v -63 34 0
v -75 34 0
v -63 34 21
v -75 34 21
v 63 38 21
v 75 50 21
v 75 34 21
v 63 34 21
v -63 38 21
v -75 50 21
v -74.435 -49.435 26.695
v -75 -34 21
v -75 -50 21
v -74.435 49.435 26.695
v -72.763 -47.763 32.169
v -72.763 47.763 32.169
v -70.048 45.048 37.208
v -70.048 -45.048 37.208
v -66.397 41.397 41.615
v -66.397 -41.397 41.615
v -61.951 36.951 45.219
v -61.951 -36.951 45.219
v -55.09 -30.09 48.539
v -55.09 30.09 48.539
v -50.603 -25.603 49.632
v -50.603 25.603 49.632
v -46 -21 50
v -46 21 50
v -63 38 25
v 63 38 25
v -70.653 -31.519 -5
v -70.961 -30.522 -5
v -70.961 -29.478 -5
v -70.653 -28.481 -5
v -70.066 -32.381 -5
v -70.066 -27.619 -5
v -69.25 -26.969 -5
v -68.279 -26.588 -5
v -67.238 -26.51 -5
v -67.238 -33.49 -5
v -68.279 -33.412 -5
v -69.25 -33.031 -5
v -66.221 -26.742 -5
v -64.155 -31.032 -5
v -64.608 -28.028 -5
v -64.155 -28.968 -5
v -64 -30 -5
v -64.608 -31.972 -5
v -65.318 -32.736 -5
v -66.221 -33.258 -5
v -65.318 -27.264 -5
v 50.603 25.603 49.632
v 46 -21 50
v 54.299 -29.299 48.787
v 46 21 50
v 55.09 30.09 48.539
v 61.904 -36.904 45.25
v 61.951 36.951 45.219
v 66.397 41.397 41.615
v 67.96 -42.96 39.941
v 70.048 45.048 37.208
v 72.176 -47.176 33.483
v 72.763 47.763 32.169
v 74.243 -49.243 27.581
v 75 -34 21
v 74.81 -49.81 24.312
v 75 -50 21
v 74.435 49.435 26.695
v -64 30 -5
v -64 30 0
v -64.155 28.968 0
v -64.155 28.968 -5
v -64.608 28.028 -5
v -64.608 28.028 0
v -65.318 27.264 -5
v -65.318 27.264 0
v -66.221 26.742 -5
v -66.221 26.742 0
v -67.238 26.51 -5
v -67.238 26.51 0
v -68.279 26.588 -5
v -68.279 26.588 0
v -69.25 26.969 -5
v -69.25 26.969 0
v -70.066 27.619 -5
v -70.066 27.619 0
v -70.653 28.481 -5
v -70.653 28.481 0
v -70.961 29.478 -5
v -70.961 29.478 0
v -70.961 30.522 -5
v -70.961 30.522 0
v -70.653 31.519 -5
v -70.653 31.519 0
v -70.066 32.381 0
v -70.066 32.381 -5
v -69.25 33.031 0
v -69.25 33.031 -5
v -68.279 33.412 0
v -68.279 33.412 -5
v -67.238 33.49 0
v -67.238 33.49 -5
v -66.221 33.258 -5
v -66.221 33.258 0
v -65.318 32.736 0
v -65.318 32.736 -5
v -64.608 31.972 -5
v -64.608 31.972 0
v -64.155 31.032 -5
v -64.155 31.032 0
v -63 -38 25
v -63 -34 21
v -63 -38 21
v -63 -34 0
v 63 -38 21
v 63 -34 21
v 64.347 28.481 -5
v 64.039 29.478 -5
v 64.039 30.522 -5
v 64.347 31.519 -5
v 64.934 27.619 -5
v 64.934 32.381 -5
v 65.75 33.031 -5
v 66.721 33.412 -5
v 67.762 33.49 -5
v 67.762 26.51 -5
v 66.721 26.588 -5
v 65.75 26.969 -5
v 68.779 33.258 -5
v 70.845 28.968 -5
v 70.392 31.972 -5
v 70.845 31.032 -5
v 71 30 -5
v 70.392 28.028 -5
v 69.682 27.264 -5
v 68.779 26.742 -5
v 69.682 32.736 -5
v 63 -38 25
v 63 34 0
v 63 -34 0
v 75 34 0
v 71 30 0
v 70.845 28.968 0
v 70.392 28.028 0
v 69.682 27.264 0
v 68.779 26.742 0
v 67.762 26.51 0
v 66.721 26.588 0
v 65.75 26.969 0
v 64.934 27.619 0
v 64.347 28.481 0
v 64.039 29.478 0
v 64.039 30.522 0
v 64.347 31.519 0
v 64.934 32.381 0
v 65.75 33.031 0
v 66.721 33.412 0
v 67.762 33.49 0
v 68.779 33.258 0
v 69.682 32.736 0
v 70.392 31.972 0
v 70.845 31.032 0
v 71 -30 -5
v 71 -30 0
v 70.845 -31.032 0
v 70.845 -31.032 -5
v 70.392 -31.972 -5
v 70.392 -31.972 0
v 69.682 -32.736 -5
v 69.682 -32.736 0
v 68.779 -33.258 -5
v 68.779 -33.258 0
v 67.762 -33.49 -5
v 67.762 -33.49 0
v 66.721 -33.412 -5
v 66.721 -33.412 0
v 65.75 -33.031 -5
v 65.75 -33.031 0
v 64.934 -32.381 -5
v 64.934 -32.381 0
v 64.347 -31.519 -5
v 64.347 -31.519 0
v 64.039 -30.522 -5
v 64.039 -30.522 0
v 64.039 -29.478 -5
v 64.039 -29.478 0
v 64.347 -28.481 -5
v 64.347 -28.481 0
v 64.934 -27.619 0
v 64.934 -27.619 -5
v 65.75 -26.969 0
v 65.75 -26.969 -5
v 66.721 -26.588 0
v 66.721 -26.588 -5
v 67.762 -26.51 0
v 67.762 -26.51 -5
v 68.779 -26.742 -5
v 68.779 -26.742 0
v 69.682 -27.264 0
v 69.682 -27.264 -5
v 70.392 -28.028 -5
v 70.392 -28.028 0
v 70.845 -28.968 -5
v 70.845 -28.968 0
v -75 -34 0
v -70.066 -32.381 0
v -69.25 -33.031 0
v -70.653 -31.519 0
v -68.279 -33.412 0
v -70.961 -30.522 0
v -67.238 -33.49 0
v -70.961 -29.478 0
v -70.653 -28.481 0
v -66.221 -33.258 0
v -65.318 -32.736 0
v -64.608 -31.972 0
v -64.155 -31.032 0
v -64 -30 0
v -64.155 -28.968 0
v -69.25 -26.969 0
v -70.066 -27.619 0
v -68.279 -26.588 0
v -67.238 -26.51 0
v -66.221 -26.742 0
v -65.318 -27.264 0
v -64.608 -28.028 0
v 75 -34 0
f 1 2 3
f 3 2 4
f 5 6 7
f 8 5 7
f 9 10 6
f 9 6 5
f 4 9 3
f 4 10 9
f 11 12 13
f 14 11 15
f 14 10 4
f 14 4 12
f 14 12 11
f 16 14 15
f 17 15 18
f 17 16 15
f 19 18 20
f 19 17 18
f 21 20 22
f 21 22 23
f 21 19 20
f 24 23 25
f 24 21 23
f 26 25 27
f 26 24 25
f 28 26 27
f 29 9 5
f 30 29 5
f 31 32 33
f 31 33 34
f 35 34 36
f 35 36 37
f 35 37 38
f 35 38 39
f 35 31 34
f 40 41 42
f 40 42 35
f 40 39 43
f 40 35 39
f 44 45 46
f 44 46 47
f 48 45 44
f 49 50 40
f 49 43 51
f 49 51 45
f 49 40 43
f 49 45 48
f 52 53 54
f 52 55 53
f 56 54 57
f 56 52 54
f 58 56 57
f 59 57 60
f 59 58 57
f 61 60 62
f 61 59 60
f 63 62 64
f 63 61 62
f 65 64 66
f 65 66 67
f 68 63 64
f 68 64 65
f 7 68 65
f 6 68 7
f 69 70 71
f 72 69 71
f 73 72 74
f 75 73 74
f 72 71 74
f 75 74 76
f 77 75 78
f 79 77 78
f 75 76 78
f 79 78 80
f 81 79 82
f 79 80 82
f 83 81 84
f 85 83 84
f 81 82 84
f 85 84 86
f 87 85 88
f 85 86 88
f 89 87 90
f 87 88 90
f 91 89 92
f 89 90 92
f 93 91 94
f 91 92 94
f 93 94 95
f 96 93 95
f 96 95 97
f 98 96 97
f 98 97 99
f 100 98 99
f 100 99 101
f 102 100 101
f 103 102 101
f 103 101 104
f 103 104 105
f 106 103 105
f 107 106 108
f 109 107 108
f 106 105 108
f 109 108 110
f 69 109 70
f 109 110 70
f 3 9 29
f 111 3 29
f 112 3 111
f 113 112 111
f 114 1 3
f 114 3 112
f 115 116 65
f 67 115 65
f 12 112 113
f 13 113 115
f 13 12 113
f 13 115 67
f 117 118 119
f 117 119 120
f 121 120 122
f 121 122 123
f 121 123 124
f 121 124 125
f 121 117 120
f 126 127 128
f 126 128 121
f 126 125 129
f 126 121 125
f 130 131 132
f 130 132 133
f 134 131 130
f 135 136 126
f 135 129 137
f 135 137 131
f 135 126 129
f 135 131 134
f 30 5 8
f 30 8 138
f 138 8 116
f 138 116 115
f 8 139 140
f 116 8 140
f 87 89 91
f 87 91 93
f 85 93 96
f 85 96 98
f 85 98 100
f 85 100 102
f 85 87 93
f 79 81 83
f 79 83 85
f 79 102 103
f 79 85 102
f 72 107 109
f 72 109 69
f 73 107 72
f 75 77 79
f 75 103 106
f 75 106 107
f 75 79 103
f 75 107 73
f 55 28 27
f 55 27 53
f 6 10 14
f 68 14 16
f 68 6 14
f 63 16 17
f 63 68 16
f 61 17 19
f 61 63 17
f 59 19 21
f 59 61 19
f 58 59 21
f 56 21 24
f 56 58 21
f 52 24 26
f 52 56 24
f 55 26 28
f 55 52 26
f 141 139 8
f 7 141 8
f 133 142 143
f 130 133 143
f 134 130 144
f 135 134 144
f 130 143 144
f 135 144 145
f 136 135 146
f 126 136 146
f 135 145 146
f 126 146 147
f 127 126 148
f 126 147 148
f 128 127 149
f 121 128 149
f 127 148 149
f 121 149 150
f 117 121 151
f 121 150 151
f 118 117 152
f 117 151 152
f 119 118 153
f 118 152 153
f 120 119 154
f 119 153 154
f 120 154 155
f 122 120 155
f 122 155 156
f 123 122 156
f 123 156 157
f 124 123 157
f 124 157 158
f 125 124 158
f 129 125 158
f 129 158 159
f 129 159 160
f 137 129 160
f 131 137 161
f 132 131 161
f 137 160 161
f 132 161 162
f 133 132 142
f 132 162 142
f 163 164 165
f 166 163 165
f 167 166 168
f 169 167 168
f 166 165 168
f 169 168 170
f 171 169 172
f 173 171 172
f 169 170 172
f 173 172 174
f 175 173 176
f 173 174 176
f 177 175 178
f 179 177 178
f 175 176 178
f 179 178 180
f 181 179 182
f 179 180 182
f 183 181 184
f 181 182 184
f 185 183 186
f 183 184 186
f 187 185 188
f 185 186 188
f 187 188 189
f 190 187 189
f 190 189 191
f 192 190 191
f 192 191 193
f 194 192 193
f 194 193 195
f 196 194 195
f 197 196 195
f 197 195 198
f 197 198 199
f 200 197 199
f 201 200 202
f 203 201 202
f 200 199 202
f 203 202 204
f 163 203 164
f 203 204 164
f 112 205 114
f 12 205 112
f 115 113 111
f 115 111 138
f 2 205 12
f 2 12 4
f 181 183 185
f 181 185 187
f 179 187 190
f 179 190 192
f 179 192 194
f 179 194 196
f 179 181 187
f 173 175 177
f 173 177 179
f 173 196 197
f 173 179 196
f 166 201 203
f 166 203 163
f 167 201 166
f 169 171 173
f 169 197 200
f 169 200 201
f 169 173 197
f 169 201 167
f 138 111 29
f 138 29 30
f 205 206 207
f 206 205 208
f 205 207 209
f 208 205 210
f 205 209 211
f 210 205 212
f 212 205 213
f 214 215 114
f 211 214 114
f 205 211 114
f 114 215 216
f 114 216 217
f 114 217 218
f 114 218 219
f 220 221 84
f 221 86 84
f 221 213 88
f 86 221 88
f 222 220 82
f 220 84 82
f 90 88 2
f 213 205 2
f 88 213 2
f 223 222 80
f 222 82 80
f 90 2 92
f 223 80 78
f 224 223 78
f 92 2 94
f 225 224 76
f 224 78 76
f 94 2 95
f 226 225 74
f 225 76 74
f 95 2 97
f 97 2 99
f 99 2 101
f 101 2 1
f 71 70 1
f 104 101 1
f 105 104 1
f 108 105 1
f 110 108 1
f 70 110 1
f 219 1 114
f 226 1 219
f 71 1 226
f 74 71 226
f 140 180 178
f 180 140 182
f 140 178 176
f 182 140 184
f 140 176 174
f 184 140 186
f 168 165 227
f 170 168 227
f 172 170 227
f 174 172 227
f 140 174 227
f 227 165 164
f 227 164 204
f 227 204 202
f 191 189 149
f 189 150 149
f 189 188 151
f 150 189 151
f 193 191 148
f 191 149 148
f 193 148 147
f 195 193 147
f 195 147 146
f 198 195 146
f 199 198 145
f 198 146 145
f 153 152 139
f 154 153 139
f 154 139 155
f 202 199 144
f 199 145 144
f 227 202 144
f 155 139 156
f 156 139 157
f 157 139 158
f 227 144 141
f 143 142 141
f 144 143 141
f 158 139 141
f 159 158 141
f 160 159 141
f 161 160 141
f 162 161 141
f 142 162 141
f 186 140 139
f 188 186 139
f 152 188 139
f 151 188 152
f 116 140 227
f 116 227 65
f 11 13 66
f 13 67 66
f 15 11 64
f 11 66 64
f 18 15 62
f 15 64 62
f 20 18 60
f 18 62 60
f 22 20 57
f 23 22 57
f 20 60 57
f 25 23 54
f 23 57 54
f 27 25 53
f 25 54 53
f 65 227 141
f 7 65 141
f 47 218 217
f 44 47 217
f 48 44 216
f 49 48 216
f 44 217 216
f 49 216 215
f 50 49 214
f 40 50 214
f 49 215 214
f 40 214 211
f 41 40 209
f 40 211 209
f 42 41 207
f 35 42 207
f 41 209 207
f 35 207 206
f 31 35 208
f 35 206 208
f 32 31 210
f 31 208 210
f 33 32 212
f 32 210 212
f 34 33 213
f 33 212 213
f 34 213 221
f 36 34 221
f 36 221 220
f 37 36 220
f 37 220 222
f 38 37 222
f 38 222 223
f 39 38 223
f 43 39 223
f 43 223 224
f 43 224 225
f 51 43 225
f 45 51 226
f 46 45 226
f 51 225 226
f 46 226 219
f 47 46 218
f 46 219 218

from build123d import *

# Parameters (mm, degrees)
SKETCH_W        = 150
SKETCH_H        = 100
PAD_DEPTH       = 50
SKETCH001_R     = 3.5
PAD001_DEPTH    = 5
SKETCH002_W     = 33
SKETCH002_H     = 12
POCKET_DEPTH    = 20
FILLET_R        = 29
SKETCH004_W     = 126
SKETCH004_H     = 76
POCKET001_DEPTH = 25
SKETCH005_R     = 4
POCKET002_DEPTH = 5
SKETCH006_W     = 20.5
SKETCH006_H     = 20
POCKET003_DEPTH = 100
SKETCH008_W     = 16
SKETCH008_H     = 21
POCKET004_DEPTH = 200


with BuildPart() as part:
    # Sketch → Pad (new body)
    with BuildSketch(Plane.XY):
        Rectangle(SKETCH_W, SKETCH_H)
    extrude(amount=PAD_DEPTH)

    # Sketch001 (on Face5 of Pad) → Pad001 (join)
    with BuildSketch(Plane(origin=(0, 0, 0), x_dir=(1, 0, 0), z_dir=(0, 0, -1))):
        with Locations((67.5, 30)):
            Circle(SKETCH001_R)
        with Locations((67.5, -30)):
            Circle(SKETCH001_R)
        with Locations((-67.5, -30)):
            Circle(SKETCH001_R)
        with Locations((-67.5, 30)):
            Circle(SKETCH001_R)
    extrude(amount=PAD001_DEPTH)

    # Sketch002 (on Face4 of Pad001) → Pocket (cut)
    with BuildSketch(Plane(origin=(0, 0, 0), x_dir=(1, 0, 0), z_dir=(0, 0, -1))):
        with Locations((-53.5, 44)):
            Rectangle(SKETCH002_W, SKETCH002_H)
        with Locations((53.5, 44)):
            Rectangle(SKETCH002_W, SKETCH002_H)
        with Locations((0, 44)):
            Rectangle(SKETCH002_W, SKETCH002_H)
        with Locations((-53.5, -44)):
            Rectangle(SKETCH002_W, SKETCH002_H)
        with Locations((0, -44)):
            Rectangle(SKETCH002_W, SKETCH002_H)
        with Locations((53.5, -44)):
            Rectangle(SKETCH002_W, SKETCH002_H)
    extrude(amount=-POCKET_DEPTH, mode=Mode.SUBTRACT)

    # Fillet
    fillet_edges = [part.edges().sort_by_distance(p)[0] for p in [
        (0, 50, 50),
        (75, 0, 50),
        (0, -50, 50),
        (-75, 0, 50),
    ]]
    fillet(fillet_edges, radius=FILLET_R)

    # Sketch004 (on Face4 of Fillet) → Pocket001 (cut)
    with BuildSketch(Plane(origin=(0, 0, 0), x_dir=(1, 0, 0), z_dir=(0, 0, -1))):
        Rectangle(SKETCH004_W, SKETCH004_H)
    extrude(amount=-POCKET001_DEPTH, mode=Mode.SUBTRACT)

    # Sketch005 (on Face12 of Pocket001) → Pocket002 (cut)
    with BuildSketch(Plane(origin=(0, 0, 0), x_dir=(1, 0, 0), z_dir=(0, 0, -1))):
        with Locations((-26, 42.5)):
            Circle(SKETCH005_R)
        with Locations((27.5, 42.5)):
            Circle(SKETCH005_R)
        with Locations((-26, -42.5)):
            Circle(SKETCH005_R)
        with Locations((27.5, -42.5)):
            Circle(SKETCH005_R)
    extrude(amount=-POCKET002_DEPTH, mode=Mode.SUBTRACT)

    # Sketch006 (on Face19 of Pocket002) → Pocket003 (cut)
    with BuildSketch(Plane.XZ.offset(50)):
        with Locations((-26.75, 10)):
            Rectangle(SKETCH006_W, SKETCH006_H)
        with Locations((26.75, 10)):
            Rectangle(SKETCH006_W, SKETCH006_H)
    extrude(amount=-POCKET003_DEPTH, mode=Mode.SUBTRACT)

    # Sketch008 (on Face3 of Pocket003) → Pocket004 (cut)
    with BuildSketch(Plane(origin=(-75, 0, 0), x_dir=(0, -1, 0), z_dir=(-1, 0, 0))):
        with Locations((-42, 10.5)):
            Rectangle(SKETCH008_W, SKETCH008_H)
        with Locations((42, 10.5)):
            Rectangle(SKETCH008_W, SKETCH008_H)
    extrude(amount=-POCKET004_DEPTH, mode=Mode.SUBTRACT)


solid = part.part
